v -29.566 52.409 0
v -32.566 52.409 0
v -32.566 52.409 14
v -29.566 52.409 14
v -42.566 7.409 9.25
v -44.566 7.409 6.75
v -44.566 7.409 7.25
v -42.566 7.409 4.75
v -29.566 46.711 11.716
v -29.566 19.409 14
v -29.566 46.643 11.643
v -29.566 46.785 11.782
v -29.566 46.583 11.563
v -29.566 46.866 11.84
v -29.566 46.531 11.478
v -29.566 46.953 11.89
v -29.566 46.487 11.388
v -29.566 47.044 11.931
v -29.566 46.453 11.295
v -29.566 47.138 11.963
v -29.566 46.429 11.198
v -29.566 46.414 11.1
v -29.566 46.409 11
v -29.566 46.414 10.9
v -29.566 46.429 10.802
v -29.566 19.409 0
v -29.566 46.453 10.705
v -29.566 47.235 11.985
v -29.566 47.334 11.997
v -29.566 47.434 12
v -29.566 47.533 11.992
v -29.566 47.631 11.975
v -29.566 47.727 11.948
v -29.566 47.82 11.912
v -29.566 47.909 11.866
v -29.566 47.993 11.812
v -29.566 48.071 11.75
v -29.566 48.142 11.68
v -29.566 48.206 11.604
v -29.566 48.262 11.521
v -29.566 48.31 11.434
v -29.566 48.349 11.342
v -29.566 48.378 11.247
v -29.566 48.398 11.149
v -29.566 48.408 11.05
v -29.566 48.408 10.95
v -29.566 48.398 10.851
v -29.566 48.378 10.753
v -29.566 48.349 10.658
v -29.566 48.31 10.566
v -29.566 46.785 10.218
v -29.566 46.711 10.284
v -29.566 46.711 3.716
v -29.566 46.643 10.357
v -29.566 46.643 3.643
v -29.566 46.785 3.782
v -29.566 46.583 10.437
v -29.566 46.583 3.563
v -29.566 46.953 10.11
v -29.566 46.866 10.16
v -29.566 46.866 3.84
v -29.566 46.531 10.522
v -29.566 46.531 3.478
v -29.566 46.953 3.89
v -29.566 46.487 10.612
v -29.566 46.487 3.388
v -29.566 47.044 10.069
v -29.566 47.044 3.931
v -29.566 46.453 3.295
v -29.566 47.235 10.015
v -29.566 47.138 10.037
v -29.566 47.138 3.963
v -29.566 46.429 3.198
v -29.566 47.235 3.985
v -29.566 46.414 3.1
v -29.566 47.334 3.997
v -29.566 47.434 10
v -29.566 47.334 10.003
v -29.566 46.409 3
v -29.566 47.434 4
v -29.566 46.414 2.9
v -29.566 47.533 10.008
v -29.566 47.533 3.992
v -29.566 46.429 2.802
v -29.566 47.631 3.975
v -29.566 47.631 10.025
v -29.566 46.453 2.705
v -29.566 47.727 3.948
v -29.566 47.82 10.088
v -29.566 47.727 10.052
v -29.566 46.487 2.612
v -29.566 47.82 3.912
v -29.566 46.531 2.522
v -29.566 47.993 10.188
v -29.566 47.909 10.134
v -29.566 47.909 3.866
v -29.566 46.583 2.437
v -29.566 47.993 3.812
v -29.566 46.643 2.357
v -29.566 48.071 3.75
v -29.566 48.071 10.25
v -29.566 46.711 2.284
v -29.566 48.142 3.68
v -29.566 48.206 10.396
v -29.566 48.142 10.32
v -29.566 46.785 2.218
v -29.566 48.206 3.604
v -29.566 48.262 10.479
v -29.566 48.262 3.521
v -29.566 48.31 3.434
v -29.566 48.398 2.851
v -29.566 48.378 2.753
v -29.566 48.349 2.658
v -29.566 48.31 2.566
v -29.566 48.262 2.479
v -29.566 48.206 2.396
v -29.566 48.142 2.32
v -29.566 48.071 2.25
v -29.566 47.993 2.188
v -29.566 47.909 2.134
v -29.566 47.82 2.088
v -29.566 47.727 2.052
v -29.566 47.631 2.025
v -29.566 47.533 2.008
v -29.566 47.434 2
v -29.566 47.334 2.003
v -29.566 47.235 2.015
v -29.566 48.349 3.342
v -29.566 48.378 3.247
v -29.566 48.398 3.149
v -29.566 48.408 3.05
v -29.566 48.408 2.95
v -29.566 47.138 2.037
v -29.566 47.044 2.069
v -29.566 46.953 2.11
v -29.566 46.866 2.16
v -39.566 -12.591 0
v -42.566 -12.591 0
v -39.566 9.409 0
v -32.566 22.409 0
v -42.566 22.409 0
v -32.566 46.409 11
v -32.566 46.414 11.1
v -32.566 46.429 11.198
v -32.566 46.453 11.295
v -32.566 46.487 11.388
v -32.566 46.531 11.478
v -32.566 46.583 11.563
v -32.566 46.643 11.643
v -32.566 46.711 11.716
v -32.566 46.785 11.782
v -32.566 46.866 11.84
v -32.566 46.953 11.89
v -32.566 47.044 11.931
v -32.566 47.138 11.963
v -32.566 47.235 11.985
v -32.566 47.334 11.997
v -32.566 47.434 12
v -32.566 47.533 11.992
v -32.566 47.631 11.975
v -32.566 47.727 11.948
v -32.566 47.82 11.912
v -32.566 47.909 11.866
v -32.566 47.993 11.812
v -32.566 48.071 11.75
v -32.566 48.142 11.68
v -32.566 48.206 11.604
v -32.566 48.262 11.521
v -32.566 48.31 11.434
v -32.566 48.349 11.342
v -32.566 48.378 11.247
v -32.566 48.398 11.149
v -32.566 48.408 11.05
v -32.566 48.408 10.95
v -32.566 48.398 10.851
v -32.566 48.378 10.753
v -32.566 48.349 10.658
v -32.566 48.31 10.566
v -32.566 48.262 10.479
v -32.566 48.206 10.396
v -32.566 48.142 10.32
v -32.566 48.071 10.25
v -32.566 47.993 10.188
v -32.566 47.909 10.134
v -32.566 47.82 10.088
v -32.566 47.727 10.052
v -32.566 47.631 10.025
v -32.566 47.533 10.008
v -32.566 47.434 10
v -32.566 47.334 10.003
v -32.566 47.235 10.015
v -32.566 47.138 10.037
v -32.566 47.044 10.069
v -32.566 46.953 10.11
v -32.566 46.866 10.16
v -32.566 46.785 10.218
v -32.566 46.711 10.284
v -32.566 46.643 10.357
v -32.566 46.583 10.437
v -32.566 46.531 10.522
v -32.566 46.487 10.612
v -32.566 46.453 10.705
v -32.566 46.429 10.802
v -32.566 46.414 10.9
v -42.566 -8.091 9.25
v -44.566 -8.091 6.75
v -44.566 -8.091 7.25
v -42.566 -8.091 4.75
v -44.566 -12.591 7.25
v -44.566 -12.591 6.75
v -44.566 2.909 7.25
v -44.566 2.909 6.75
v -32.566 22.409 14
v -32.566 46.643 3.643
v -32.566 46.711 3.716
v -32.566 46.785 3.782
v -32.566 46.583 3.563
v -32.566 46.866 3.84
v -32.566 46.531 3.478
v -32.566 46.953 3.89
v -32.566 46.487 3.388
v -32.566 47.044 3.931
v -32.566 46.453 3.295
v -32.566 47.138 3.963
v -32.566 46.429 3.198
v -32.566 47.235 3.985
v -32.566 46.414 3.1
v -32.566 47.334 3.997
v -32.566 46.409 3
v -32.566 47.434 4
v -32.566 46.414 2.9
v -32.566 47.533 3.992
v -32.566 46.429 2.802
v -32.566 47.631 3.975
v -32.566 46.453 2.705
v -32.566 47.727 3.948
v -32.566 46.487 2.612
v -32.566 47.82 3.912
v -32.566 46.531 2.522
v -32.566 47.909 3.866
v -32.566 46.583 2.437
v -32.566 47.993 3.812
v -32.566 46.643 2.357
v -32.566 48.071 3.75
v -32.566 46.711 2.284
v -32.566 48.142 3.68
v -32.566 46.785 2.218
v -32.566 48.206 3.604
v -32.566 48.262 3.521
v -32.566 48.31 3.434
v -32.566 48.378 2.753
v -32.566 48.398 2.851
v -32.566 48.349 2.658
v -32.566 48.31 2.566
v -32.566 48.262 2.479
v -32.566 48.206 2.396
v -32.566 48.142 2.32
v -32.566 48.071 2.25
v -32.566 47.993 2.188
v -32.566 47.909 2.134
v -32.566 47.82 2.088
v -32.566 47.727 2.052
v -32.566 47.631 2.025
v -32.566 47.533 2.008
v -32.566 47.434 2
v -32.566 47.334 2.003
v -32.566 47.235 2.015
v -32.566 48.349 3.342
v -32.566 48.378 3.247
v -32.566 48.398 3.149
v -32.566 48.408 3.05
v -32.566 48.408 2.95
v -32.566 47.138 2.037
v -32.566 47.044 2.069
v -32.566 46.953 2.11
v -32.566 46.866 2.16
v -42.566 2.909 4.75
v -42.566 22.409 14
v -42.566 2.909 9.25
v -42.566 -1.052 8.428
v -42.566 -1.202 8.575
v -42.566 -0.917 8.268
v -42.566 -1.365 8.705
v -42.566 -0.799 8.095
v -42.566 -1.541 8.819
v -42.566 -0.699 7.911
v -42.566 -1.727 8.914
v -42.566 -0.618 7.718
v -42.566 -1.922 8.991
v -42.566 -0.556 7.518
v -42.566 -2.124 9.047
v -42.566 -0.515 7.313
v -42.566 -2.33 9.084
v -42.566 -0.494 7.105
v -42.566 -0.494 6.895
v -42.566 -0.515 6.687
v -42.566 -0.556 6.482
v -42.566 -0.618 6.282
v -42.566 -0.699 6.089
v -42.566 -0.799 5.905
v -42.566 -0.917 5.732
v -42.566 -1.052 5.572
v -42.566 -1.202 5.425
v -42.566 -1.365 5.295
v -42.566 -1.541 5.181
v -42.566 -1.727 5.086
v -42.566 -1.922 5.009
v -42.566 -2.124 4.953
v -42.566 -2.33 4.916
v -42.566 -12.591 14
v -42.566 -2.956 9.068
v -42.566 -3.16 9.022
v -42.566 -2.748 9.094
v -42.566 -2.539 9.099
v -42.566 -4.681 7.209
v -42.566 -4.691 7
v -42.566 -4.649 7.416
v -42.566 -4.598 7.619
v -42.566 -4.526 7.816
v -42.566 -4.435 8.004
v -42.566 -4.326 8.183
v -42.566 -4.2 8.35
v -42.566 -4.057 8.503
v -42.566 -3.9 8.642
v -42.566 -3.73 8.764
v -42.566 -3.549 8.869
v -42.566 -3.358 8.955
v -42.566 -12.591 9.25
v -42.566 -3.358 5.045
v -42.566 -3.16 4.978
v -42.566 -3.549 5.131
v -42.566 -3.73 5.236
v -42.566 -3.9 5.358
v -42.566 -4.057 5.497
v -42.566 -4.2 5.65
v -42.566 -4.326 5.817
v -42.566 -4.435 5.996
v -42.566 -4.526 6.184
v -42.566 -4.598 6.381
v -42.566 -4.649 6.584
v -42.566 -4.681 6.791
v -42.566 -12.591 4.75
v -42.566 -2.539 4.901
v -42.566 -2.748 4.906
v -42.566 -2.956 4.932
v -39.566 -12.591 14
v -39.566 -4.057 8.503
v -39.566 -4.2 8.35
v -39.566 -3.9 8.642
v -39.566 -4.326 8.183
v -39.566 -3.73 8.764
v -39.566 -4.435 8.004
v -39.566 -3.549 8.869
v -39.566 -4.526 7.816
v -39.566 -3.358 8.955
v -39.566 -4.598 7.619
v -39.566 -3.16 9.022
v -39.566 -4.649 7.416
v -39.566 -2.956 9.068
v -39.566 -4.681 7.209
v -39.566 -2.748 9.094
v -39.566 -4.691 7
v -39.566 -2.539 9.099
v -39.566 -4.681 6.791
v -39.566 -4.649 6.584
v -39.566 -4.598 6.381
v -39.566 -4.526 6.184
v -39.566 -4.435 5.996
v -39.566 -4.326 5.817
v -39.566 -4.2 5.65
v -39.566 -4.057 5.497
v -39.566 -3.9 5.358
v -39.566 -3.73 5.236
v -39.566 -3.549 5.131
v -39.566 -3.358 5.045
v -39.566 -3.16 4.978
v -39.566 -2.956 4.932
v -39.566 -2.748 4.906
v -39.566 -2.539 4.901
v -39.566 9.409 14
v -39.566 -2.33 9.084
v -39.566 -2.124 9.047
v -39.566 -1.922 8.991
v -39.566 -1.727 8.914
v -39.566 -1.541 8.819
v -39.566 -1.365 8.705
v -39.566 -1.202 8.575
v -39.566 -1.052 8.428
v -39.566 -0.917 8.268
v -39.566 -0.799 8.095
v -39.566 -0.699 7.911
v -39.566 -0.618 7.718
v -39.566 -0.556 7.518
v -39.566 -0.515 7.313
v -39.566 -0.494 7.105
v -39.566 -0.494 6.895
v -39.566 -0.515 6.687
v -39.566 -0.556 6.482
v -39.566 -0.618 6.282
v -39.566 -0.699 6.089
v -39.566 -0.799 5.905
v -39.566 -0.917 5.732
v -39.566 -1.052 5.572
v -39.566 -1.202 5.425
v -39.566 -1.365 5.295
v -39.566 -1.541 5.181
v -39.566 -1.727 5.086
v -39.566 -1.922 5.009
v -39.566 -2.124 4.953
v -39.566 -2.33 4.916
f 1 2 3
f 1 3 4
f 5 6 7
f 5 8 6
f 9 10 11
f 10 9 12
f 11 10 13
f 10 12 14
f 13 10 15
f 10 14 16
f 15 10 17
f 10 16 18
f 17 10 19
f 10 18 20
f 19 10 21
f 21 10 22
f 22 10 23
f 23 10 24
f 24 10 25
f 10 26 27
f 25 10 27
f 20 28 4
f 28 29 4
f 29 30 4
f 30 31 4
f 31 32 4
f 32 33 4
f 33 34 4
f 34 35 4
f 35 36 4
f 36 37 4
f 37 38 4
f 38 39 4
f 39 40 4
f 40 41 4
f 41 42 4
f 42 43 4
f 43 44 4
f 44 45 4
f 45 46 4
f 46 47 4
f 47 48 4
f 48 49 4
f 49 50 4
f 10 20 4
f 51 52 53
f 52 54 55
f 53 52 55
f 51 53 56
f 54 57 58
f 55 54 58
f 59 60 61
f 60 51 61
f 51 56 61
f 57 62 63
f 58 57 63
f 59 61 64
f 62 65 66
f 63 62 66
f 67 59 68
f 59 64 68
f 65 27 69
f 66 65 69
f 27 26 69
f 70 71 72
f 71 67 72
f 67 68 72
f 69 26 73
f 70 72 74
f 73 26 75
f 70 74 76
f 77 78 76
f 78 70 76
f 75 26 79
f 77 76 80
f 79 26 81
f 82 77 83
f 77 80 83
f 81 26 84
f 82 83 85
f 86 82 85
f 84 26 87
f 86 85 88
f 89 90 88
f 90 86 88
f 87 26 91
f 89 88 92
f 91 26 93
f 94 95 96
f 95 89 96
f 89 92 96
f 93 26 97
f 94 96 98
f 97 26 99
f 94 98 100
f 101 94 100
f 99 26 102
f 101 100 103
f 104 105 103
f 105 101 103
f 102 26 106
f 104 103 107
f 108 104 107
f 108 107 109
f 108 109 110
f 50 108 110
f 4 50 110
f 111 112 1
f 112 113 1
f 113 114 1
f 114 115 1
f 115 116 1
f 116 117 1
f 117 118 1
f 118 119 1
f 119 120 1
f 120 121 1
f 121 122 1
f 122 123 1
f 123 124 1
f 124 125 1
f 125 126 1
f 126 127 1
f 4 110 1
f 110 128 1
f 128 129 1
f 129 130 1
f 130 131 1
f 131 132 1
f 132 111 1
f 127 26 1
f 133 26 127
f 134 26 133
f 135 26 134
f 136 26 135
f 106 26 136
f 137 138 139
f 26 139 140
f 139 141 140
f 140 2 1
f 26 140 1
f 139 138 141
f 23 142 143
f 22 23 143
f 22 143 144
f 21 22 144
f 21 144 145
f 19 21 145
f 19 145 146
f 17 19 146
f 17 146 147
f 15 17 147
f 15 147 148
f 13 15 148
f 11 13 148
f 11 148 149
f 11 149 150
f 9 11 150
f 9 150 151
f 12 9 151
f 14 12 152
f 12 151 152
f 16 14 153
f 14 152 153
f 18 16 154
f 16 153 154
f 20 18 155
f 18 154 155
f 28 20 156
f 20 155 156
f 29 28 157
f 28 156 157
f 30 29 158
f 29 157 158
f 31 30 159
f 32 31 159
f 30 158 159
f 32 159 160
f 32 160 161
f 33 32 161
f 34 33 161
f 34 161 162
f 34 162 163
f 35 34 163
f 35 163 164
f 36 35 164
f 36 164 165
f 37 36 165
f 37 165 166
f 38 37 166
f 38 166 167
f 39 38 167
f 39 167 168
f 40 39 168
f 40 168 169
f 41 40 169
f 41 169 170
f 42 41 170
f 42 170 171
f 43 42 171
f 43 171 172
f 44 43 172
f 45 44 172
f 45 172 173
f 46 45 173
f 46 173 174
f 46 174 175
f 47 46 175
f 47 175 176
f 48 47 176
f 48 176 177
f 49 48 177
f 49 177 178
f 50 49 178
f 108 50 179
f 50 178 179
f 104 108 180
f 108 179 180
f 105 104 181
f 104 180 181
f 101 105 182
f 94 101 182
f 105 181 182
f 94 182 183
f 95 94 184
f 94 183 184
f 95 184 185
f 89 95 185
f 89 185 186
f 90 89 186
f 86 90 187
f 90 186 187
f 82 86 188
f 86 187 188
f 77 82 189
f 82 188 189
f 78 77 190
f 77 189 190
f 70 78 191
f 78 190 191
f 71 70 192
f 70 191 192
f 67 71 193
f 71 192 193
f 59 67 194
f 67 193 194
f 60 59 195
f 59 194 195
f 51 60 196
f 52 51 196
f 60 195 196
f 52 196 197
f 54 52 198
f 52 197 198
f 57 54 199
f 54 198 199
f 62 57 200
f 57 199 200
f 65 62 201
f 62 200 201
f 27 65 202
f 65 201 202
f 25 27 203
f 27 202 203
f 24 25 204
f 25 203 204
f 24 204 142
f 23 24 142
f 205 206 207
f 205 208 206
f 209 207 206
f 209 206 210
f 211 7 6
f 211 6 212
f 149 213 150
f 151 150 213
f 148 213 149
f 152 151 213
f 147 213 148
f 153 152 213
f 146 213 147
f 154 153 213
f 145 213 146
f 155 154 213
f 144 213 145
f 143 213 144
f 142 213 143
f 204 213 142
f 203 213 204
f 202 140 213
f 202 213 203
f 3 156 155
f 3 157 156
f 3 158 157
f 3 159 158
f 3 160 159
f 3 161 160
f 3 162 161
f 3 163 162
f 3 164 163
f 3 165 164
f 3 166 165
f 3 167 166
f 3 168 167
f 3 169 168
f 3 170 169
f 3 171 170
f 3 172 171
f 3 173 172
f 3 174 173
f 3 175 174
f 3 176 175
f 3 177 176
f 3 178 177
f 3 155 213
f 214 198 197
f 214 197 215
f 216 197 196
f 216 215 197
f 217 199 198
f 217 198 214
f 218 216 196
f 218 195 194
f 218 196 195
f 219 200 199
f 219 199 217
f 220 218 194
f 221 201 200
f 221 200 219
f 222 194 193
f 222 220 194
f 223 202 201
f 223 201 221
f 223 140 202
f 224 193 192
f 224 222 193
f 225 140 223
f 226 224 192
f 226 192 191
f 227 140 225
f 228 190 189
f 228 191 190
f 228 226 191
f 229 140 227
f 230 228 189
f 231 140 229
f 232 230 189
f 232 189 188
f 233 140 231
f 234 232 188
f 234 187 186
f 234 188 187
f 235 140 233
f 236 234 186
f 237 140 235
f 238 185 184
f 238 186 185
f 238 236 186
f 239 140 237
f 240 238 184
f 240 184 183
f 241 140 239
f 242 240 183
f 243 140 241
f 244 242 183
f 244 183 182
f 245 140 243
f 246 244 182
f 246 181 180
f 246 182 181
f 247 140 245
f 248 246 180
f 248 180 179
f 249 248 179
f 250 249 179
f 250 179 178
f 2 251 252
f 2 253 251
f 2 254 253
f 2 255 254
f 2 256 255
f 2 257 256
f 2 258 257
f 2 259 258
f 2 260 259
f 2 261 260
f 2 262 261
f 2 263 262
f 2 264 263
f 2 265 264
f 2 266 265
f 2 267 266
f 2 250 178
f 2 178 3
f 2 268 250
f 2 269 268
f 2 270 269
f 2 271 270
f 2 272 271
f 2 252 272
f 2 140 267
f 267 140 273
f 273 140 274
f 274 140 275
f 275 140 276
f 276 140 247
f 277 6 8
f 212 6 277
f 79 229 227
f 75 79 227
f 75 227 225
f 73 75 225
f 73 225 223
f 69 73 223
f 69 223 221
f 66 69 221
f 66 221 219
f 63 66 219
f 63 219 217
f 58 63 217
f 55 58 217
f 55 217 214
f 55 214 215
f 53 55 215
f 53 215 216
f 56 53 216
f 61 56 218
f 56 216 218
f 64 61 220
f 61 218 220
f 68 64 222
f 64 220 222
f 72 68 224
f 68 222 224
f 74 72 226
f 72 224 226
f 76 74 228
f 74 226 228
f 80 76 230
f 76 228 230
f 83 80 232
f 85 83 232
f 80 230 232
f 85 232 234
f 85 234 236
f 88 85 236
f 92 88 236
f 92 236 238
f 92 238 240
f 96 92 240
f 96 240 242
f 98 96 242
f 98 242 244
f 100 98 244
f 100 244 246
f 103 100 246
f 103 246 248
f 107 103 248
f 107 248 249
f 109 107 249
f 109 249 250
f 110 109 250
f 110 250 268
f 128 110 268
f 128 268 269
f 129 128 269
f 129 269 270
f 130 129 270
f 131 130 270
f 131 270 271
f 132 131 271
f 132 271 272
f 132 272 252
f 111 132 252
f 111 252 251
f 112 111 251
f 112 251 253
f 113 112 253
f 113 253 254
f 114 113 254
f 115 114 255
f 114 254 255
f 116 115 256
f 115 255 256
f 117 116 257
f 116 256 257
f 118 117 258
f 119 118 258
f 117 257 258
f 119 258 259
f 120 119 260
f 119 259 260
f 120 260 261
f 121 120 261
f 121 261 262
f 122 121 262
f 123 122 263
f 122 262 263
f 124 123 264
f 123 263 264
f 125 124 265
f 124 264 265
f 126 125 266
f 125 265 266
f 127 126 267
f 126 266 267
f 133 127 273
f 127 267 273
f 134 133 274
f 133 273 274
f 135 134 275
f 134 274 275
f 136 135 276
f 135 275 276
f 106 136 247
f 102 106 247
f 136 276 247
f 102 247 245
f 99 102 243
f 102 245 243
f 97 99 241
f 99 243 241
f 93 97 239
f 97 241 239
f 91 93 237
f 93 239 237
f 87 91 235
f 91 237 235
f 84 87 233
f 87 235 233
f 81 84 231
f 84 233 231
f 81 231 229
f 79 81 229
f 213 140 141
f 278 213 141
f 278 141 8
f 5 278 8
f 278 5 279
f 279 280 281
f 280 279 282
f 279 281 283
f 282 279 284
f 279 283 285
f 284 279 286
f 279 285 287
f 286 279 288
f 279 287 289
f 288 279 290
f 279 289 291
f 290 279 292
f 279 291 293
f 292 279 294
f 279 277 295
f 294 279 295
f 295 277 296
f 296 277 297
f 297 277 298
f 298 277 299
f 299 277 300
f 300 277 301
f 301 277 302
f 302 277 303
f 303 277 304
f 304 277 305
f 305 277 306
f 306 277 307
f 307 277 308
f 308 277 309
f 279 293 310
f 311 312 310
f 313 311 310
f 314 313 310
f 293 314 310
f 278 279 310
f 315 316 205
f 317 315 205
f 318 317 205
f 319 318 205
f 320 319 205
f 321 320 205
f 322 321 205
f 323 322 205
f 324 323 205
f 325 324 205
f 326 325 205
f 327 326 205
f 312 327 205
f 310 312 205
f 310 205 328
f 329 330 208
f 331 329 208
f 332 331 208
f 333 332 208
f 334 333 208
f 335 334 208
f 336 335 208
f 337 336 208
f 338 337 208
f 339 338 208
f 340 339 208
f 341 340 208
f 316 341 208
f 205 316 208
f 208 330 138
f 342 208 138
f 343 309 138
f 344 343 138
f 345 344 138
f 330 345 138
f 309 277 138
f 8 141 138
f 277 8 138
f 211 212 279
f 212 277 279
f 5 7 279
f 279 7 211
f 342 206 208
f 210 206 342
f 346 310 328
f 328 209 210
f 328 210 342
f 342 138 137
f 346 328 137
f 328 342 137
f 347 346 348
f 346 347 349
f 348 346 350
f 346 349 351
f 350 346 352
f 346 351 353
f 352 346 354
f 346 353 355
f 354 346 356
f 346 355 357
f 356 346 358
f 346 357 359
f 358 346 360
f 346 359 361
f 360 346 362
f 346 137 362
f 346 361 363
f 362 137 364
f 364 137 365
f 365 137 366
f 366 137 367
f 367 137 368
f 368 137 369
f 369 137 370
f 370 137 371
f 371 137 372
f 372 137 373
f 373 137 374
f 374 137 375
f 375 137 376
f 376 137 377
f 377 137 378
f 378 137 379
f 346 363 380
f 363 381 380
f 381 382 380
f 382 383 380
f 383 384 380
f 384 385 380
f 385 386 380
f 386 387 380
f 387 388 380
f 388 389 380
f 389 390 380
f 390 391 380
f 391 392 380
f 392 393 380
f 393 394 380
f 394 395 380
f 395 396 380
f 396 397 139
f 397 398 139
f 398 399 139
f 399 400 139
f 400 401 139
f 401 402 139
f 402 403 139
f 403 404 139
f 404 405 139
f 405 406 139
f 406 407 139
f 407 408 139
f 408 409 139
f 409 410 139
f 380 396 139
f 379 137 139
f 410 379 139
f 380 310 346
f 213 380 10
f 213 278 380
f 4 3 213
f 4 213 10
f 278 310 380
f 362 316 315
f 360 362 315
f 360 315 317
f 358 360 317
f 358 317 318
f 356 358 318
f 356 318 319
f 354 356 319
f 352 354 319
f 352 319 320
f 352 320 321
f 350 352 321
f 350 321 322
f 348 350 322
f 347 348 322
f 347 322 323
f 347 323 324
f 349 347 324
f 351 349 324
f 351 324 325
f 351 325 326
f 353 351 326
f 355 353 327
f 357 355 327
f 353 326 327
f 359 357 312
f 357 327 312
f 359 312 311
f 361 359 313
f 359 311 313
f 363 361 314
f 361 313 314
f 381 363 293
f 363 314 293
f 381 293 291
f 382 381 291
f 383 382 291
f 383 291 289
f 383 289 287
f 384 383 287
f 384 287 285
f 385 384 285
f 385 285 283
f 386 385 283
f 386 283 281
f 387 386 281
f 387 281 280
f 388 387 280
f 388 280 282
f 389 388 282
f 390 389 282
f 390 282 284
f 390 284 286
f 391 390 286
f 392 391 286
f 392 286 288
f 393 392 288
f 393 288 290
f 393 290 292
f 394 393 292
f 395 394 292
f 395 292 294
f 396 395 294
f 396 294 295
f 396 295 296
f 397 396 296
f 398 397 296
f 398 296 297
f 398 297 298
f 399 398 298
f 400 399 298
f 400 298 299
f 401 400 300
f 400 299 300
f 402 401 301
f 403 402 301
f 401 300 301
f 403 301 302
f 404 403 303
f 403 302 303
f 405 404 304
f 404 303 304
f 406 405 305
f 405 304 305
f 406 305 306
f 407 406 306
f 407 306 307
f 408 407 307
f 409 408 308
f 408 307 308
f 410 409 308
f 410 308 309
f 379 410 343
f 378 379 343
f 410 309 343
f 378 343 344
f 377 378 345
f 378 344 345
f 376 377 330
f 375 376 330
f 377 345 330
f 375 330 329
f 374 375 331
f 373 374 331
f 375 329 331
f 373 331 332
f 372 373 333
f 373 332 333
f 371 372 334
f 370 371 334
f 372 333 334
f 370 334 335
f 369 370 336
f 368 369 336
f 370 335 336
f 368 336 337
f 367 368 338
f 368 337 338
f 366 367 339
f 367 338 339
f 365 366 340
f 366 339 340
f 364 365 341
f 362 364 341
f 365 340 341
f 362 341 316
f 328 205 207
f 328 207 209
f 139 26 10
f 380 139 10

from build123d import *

# Parameters (mm, degrees)
F0_W     = 3
F0_H     = 30
F0_H_2   = 32
F1_DEPTH = 14
F3_D     = 2
F3_DEPTH = 12
F3_TIP   = 0.600860619
F4_W     = 4.5
F4_H     = 4.5
F5_DEPTH = 2
F7_D     = 4.2
F8_SIZE  = 9.99999
F9_SIZE  = 1.99999


# Not quite as in the source:
# - a fillet or chamfer is up to 0.001 mm smaller than in the source, because OpenCascade refuses the exact size


with BuildPart() as f1:
    # F0 (on Top) → F1 (new body)
    with BuildSketch(Plane.XY):
        with Locations((-31.0656790137, 37.4089360237)):
            Rectangle(F0_W, F0_H)
        Polygon((-29.5656790137, 22.4089360237), (-32.5656790137, 22.4089360237), (-42.5656790137, 22.4089360237), (-42.5656790137, 19.4089360237), (-39.5656790137, 19.4089360237), (-29.5656790137, 19.4089360237), align=None)
        with Locations((-41.0656790137, 3.4089360237)):
            Rectangle(F0_W, F0_H_2)
    extrude(amount=F1_DEPTH)

    # F3
    with Locations(Plane.YZ.offset(-29.5656790137)):
        with Locations((47.4089360237, 11), (47.4089360237, 3)):
            Hole(F3_D / 2, depth=F3_DEPTH)
            with Locations((0, 0, -(F3_DEPTH + F3_TIP / 2))):  # 118° drill point
                Cone(0, F3_D / 2, F3_TIP, mode=Mode.SUBTRACT)

    # F4 (on face) → F5 (join)
    with BuildSketch(Plane(origin=(-42.5656790137, 0, 0), x_dir=(0, -1, 0), z_dir=(-1, 0, 0))):
        with Locations((-5.1589360237, 7)):
            Rectangle(F4_W, F4_H)
        with Locations((10.3410639763, 7)):
            Rectangle(F4_W, F4_H)
    extrude(amount=F5_DEPTH)

    # F7 (through all)
    with Locations(Plane.YZ.offset(-39.5656790137)):
        with Locations((-2.5910639763, 7)):
            Hole(F7_D / 2)

    # F8 (size 10 in the source; OpenCascade refuses exactly that, so slightly less here)
    f8_edges = [f1.edges().sort_by_distance(p)[0] for p in [
        (-39.565679, 19.408936, 7),
    ]]
    chamfer(f8_edges, length=F8_SIZE)

    # F9 (size 2 in the source; OpenCascade refuses exactly that, so slightly less here)
    f9_edges = [f1.edges().sort_by_distance(p)[0] for p in [
        (-44.565679, 5.158936, 4.75),
        (-44.565679, -10.341064, 4.75),
        (-44.565679, -10.341064, 9.25),
        (-44.565679, 5.158936, 9.25),
    ]]
    chamfer(f9_edges, length=F9_SIZE)


solid = f1.part
